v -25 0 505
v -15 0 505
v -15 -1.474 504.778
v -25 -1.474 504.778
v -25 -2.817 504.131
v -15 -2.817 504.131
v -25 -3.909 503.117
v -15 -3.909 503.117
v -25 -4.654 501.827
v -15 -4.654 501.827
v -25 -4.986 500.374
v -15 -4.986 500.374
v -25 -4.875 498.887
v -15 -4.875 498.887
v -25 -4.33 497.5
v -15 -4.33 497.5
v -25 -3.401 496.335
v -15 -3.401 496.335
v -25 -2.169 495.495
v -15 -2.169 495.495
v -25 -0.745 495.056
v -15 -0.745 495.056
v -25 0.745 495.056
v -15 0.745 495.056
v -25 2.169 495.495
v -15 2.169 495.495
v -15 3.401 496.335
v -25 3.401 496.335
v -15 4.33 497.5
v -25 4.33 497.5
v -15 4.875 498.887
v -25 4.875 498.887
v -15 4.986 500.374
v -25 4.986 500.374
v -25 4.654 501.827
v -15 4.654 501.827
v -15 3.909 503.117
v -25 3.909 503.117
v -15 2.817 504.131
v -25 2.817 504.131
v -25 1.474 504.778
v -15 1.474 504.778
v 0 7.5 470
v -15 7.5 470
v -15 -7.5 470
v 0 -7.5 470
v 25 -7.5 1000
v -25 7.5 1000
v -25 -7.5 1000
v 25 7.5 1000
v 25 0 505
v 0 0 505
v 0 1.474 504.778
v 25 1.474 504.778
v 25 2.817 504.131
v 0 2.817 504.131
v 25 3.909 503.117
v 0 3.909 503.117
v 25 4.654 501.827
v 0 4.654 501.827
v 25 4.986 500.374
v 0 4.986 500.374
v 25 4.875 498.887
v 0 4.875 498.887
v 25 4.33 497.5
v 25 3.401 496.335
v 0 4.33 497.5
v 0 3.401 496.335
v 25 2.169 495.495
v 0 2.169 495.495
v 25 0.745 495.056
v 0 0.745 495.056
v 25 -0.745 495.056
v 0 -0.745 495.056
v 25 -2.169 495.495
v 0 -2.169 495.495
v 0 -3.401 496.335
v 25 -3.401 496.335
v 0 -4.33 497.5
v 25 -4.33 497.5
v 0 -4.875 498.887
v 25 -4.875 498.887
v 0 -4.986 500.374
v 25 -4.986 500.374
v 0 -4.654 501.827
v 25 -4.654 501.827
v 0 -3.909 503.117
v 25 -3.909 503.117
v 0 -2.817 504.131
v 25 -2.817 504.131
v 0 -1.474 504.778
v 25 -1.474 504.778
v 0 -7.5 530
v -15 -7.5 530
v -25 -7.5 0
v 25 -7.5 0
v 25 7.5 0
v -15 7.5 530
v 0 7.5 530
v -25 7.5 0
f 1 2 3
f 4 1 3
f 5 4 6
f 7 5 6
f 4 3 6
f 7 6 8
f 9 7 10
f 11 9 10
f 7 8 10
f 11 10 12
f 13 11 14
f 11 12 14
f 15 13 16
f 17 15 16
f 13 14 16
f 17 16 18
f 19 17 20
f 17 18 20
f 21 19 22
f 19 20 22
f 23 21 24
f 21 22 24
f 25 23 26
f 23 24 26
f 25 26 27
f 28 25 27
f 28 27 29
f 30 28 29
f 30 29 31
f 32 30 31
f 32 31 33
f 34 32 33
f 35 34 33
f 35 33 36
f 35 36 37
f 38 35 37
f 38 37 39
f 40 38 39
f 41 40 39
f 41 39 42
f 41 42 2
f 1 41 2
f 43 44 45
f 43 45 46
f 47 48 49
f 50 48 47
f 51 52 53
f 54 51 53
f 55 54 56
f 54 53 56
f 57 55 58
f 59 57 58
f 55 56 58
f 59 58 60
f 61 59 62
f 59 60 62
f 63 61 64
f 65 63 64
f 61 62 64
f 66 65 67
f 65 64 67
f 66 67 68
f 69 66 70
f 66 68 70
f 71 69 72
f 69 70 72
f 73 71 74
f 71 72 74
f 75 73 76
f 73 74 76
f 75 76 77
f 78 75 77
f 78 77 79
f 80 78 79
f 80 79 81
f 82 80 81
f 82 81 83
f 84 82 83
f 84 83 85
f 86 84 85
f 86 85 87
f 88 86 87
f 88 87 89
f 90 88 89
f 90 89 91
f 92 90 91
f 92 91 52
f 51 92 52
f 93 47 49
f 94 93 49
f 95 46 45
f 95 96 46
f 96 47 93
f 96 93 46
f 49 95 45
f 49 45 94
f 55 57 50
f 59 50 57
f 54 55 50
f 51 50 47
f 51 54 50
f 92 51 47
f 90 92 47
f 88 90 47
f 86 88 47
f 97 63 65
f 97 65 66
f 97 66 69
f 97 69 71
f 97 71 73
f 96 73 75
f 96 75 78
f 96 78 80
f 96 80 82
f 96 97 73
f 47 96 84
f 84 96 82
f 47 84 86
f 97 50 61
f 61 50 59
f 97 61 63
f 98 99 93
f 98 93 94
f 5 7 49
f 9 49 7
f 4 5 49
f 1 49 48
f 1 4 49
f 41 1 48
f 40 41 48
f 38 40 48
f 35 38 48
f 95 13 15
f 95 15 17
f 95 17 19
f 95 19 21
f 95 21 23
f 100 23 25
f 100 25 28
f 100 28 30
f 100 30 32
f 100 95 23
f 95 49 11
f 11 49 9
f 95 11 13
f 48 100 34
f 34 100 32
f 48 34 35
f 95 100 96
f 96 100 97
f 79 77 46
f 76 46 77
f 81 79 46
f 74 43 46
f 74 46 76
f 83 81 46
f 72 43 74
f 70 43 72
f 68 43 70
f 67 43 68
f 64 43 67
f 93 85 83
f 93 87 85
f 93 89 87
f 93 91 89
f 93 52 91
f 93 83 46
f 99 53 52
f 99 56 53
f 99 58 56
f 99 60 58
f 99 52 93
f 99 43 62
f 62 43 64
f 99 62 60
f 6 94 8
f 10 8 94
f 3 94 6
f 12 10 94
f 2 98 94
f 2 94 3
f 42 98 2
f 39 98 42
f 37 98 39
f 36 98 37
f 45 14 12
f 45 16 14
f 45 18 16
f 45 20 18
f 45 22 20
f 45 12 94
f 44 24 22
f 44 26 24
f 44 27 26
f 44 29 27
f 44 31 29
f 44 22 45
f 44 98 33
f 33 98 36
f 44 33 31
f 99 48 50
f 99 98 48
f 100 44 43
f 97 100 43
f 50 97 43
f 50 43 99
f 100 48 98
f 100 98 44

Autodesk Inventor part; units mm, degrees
ref_plane "YZ Plane" through (0, 0, 0) normal (1, 0, 0) x (0, 1, 0)
ref_plane "XZ Plane" through (0, 0, 0) normal (0, 1, 0) x (-1, 0, 0)
ref_plane "XY Plane" through (0, 0, 0) normal (0, 0, 1) x (1, 0, 0)
sketch "Sketch1" plane through (0, 0, 0) normal (0, 0, 1) x (1, 0, 0)
  line L0 (-25, 7.5) -> (25, 7.5)
  line L1 (25, 7.5) -> (25, -7.5)
  line L2 (25, -7.5) -> (-25, -7.5)
  line L3 (-25, -7.5) -> (-25, 7.5)
  line L4 (0, 0) -> (0, 14.2686)
  line L5 (0, 0) -> (7.5147, 0)
  dimension "d2" = 50
  dimension "d3" = 15
extrude "Extrusion1" add sketch "Sketch1" along normal blind 1000
sketch "Sketch4" plane through (-25, 7.5, 0) normal (0, 1, 0) x (1, 0, 0)
  line L0 (25, 0) -> (25, -1000)
  line L1 (0, -1000) -> (50, -1000) projected
  line L2 (0, 0) -> (0, -1000) projected
  line L3 (0, -500) -> (50, -500)
  line L4 (50, 0) -> (50, -1000) projected
  line L5 (25, -530) -> (10, -530)
  line L6 (10, -530) -> (10, -470)
  line L7 (10, -470) -> (25, -470)
  line L8 (25, -470) -> (25, -530)
  dimension "d14" = 15
  dimension "d15" = 60
extrude "Extrusion4" cut sketch "Sketch4" against normal through all contours L5 L6 L3 L0 | L3 L6 L7 L0
sketch "Sketch5" plane through (0, 7.5, 470) normal (-1, 0, 0) x (0, 0, 1)
  line L0 (0, 0) -> (60, 0) projected
  line L1 (30, 0) -> (30, -15)
  line L2 (60, -15) -> (0, -15) projected
  line L3 (60, 0) -> (60, -15) projected
  line L4 (60, -7.5) -> (0, -7.5)
  line L5 (0, 0) -> (0, -15) projected
  circle A0 centre (30, -7.5) radius 5
  point P0 (-470, -7.5)
  dimension "d18" = 10
extrude "Extrusion5" cut sketch "Sketch5" along normal through all both and the other way through all contours A0 L4 L1 | L1 L4 A0 | L4 L1 A0 | L4 A0 L1
properties part number "Layer"
